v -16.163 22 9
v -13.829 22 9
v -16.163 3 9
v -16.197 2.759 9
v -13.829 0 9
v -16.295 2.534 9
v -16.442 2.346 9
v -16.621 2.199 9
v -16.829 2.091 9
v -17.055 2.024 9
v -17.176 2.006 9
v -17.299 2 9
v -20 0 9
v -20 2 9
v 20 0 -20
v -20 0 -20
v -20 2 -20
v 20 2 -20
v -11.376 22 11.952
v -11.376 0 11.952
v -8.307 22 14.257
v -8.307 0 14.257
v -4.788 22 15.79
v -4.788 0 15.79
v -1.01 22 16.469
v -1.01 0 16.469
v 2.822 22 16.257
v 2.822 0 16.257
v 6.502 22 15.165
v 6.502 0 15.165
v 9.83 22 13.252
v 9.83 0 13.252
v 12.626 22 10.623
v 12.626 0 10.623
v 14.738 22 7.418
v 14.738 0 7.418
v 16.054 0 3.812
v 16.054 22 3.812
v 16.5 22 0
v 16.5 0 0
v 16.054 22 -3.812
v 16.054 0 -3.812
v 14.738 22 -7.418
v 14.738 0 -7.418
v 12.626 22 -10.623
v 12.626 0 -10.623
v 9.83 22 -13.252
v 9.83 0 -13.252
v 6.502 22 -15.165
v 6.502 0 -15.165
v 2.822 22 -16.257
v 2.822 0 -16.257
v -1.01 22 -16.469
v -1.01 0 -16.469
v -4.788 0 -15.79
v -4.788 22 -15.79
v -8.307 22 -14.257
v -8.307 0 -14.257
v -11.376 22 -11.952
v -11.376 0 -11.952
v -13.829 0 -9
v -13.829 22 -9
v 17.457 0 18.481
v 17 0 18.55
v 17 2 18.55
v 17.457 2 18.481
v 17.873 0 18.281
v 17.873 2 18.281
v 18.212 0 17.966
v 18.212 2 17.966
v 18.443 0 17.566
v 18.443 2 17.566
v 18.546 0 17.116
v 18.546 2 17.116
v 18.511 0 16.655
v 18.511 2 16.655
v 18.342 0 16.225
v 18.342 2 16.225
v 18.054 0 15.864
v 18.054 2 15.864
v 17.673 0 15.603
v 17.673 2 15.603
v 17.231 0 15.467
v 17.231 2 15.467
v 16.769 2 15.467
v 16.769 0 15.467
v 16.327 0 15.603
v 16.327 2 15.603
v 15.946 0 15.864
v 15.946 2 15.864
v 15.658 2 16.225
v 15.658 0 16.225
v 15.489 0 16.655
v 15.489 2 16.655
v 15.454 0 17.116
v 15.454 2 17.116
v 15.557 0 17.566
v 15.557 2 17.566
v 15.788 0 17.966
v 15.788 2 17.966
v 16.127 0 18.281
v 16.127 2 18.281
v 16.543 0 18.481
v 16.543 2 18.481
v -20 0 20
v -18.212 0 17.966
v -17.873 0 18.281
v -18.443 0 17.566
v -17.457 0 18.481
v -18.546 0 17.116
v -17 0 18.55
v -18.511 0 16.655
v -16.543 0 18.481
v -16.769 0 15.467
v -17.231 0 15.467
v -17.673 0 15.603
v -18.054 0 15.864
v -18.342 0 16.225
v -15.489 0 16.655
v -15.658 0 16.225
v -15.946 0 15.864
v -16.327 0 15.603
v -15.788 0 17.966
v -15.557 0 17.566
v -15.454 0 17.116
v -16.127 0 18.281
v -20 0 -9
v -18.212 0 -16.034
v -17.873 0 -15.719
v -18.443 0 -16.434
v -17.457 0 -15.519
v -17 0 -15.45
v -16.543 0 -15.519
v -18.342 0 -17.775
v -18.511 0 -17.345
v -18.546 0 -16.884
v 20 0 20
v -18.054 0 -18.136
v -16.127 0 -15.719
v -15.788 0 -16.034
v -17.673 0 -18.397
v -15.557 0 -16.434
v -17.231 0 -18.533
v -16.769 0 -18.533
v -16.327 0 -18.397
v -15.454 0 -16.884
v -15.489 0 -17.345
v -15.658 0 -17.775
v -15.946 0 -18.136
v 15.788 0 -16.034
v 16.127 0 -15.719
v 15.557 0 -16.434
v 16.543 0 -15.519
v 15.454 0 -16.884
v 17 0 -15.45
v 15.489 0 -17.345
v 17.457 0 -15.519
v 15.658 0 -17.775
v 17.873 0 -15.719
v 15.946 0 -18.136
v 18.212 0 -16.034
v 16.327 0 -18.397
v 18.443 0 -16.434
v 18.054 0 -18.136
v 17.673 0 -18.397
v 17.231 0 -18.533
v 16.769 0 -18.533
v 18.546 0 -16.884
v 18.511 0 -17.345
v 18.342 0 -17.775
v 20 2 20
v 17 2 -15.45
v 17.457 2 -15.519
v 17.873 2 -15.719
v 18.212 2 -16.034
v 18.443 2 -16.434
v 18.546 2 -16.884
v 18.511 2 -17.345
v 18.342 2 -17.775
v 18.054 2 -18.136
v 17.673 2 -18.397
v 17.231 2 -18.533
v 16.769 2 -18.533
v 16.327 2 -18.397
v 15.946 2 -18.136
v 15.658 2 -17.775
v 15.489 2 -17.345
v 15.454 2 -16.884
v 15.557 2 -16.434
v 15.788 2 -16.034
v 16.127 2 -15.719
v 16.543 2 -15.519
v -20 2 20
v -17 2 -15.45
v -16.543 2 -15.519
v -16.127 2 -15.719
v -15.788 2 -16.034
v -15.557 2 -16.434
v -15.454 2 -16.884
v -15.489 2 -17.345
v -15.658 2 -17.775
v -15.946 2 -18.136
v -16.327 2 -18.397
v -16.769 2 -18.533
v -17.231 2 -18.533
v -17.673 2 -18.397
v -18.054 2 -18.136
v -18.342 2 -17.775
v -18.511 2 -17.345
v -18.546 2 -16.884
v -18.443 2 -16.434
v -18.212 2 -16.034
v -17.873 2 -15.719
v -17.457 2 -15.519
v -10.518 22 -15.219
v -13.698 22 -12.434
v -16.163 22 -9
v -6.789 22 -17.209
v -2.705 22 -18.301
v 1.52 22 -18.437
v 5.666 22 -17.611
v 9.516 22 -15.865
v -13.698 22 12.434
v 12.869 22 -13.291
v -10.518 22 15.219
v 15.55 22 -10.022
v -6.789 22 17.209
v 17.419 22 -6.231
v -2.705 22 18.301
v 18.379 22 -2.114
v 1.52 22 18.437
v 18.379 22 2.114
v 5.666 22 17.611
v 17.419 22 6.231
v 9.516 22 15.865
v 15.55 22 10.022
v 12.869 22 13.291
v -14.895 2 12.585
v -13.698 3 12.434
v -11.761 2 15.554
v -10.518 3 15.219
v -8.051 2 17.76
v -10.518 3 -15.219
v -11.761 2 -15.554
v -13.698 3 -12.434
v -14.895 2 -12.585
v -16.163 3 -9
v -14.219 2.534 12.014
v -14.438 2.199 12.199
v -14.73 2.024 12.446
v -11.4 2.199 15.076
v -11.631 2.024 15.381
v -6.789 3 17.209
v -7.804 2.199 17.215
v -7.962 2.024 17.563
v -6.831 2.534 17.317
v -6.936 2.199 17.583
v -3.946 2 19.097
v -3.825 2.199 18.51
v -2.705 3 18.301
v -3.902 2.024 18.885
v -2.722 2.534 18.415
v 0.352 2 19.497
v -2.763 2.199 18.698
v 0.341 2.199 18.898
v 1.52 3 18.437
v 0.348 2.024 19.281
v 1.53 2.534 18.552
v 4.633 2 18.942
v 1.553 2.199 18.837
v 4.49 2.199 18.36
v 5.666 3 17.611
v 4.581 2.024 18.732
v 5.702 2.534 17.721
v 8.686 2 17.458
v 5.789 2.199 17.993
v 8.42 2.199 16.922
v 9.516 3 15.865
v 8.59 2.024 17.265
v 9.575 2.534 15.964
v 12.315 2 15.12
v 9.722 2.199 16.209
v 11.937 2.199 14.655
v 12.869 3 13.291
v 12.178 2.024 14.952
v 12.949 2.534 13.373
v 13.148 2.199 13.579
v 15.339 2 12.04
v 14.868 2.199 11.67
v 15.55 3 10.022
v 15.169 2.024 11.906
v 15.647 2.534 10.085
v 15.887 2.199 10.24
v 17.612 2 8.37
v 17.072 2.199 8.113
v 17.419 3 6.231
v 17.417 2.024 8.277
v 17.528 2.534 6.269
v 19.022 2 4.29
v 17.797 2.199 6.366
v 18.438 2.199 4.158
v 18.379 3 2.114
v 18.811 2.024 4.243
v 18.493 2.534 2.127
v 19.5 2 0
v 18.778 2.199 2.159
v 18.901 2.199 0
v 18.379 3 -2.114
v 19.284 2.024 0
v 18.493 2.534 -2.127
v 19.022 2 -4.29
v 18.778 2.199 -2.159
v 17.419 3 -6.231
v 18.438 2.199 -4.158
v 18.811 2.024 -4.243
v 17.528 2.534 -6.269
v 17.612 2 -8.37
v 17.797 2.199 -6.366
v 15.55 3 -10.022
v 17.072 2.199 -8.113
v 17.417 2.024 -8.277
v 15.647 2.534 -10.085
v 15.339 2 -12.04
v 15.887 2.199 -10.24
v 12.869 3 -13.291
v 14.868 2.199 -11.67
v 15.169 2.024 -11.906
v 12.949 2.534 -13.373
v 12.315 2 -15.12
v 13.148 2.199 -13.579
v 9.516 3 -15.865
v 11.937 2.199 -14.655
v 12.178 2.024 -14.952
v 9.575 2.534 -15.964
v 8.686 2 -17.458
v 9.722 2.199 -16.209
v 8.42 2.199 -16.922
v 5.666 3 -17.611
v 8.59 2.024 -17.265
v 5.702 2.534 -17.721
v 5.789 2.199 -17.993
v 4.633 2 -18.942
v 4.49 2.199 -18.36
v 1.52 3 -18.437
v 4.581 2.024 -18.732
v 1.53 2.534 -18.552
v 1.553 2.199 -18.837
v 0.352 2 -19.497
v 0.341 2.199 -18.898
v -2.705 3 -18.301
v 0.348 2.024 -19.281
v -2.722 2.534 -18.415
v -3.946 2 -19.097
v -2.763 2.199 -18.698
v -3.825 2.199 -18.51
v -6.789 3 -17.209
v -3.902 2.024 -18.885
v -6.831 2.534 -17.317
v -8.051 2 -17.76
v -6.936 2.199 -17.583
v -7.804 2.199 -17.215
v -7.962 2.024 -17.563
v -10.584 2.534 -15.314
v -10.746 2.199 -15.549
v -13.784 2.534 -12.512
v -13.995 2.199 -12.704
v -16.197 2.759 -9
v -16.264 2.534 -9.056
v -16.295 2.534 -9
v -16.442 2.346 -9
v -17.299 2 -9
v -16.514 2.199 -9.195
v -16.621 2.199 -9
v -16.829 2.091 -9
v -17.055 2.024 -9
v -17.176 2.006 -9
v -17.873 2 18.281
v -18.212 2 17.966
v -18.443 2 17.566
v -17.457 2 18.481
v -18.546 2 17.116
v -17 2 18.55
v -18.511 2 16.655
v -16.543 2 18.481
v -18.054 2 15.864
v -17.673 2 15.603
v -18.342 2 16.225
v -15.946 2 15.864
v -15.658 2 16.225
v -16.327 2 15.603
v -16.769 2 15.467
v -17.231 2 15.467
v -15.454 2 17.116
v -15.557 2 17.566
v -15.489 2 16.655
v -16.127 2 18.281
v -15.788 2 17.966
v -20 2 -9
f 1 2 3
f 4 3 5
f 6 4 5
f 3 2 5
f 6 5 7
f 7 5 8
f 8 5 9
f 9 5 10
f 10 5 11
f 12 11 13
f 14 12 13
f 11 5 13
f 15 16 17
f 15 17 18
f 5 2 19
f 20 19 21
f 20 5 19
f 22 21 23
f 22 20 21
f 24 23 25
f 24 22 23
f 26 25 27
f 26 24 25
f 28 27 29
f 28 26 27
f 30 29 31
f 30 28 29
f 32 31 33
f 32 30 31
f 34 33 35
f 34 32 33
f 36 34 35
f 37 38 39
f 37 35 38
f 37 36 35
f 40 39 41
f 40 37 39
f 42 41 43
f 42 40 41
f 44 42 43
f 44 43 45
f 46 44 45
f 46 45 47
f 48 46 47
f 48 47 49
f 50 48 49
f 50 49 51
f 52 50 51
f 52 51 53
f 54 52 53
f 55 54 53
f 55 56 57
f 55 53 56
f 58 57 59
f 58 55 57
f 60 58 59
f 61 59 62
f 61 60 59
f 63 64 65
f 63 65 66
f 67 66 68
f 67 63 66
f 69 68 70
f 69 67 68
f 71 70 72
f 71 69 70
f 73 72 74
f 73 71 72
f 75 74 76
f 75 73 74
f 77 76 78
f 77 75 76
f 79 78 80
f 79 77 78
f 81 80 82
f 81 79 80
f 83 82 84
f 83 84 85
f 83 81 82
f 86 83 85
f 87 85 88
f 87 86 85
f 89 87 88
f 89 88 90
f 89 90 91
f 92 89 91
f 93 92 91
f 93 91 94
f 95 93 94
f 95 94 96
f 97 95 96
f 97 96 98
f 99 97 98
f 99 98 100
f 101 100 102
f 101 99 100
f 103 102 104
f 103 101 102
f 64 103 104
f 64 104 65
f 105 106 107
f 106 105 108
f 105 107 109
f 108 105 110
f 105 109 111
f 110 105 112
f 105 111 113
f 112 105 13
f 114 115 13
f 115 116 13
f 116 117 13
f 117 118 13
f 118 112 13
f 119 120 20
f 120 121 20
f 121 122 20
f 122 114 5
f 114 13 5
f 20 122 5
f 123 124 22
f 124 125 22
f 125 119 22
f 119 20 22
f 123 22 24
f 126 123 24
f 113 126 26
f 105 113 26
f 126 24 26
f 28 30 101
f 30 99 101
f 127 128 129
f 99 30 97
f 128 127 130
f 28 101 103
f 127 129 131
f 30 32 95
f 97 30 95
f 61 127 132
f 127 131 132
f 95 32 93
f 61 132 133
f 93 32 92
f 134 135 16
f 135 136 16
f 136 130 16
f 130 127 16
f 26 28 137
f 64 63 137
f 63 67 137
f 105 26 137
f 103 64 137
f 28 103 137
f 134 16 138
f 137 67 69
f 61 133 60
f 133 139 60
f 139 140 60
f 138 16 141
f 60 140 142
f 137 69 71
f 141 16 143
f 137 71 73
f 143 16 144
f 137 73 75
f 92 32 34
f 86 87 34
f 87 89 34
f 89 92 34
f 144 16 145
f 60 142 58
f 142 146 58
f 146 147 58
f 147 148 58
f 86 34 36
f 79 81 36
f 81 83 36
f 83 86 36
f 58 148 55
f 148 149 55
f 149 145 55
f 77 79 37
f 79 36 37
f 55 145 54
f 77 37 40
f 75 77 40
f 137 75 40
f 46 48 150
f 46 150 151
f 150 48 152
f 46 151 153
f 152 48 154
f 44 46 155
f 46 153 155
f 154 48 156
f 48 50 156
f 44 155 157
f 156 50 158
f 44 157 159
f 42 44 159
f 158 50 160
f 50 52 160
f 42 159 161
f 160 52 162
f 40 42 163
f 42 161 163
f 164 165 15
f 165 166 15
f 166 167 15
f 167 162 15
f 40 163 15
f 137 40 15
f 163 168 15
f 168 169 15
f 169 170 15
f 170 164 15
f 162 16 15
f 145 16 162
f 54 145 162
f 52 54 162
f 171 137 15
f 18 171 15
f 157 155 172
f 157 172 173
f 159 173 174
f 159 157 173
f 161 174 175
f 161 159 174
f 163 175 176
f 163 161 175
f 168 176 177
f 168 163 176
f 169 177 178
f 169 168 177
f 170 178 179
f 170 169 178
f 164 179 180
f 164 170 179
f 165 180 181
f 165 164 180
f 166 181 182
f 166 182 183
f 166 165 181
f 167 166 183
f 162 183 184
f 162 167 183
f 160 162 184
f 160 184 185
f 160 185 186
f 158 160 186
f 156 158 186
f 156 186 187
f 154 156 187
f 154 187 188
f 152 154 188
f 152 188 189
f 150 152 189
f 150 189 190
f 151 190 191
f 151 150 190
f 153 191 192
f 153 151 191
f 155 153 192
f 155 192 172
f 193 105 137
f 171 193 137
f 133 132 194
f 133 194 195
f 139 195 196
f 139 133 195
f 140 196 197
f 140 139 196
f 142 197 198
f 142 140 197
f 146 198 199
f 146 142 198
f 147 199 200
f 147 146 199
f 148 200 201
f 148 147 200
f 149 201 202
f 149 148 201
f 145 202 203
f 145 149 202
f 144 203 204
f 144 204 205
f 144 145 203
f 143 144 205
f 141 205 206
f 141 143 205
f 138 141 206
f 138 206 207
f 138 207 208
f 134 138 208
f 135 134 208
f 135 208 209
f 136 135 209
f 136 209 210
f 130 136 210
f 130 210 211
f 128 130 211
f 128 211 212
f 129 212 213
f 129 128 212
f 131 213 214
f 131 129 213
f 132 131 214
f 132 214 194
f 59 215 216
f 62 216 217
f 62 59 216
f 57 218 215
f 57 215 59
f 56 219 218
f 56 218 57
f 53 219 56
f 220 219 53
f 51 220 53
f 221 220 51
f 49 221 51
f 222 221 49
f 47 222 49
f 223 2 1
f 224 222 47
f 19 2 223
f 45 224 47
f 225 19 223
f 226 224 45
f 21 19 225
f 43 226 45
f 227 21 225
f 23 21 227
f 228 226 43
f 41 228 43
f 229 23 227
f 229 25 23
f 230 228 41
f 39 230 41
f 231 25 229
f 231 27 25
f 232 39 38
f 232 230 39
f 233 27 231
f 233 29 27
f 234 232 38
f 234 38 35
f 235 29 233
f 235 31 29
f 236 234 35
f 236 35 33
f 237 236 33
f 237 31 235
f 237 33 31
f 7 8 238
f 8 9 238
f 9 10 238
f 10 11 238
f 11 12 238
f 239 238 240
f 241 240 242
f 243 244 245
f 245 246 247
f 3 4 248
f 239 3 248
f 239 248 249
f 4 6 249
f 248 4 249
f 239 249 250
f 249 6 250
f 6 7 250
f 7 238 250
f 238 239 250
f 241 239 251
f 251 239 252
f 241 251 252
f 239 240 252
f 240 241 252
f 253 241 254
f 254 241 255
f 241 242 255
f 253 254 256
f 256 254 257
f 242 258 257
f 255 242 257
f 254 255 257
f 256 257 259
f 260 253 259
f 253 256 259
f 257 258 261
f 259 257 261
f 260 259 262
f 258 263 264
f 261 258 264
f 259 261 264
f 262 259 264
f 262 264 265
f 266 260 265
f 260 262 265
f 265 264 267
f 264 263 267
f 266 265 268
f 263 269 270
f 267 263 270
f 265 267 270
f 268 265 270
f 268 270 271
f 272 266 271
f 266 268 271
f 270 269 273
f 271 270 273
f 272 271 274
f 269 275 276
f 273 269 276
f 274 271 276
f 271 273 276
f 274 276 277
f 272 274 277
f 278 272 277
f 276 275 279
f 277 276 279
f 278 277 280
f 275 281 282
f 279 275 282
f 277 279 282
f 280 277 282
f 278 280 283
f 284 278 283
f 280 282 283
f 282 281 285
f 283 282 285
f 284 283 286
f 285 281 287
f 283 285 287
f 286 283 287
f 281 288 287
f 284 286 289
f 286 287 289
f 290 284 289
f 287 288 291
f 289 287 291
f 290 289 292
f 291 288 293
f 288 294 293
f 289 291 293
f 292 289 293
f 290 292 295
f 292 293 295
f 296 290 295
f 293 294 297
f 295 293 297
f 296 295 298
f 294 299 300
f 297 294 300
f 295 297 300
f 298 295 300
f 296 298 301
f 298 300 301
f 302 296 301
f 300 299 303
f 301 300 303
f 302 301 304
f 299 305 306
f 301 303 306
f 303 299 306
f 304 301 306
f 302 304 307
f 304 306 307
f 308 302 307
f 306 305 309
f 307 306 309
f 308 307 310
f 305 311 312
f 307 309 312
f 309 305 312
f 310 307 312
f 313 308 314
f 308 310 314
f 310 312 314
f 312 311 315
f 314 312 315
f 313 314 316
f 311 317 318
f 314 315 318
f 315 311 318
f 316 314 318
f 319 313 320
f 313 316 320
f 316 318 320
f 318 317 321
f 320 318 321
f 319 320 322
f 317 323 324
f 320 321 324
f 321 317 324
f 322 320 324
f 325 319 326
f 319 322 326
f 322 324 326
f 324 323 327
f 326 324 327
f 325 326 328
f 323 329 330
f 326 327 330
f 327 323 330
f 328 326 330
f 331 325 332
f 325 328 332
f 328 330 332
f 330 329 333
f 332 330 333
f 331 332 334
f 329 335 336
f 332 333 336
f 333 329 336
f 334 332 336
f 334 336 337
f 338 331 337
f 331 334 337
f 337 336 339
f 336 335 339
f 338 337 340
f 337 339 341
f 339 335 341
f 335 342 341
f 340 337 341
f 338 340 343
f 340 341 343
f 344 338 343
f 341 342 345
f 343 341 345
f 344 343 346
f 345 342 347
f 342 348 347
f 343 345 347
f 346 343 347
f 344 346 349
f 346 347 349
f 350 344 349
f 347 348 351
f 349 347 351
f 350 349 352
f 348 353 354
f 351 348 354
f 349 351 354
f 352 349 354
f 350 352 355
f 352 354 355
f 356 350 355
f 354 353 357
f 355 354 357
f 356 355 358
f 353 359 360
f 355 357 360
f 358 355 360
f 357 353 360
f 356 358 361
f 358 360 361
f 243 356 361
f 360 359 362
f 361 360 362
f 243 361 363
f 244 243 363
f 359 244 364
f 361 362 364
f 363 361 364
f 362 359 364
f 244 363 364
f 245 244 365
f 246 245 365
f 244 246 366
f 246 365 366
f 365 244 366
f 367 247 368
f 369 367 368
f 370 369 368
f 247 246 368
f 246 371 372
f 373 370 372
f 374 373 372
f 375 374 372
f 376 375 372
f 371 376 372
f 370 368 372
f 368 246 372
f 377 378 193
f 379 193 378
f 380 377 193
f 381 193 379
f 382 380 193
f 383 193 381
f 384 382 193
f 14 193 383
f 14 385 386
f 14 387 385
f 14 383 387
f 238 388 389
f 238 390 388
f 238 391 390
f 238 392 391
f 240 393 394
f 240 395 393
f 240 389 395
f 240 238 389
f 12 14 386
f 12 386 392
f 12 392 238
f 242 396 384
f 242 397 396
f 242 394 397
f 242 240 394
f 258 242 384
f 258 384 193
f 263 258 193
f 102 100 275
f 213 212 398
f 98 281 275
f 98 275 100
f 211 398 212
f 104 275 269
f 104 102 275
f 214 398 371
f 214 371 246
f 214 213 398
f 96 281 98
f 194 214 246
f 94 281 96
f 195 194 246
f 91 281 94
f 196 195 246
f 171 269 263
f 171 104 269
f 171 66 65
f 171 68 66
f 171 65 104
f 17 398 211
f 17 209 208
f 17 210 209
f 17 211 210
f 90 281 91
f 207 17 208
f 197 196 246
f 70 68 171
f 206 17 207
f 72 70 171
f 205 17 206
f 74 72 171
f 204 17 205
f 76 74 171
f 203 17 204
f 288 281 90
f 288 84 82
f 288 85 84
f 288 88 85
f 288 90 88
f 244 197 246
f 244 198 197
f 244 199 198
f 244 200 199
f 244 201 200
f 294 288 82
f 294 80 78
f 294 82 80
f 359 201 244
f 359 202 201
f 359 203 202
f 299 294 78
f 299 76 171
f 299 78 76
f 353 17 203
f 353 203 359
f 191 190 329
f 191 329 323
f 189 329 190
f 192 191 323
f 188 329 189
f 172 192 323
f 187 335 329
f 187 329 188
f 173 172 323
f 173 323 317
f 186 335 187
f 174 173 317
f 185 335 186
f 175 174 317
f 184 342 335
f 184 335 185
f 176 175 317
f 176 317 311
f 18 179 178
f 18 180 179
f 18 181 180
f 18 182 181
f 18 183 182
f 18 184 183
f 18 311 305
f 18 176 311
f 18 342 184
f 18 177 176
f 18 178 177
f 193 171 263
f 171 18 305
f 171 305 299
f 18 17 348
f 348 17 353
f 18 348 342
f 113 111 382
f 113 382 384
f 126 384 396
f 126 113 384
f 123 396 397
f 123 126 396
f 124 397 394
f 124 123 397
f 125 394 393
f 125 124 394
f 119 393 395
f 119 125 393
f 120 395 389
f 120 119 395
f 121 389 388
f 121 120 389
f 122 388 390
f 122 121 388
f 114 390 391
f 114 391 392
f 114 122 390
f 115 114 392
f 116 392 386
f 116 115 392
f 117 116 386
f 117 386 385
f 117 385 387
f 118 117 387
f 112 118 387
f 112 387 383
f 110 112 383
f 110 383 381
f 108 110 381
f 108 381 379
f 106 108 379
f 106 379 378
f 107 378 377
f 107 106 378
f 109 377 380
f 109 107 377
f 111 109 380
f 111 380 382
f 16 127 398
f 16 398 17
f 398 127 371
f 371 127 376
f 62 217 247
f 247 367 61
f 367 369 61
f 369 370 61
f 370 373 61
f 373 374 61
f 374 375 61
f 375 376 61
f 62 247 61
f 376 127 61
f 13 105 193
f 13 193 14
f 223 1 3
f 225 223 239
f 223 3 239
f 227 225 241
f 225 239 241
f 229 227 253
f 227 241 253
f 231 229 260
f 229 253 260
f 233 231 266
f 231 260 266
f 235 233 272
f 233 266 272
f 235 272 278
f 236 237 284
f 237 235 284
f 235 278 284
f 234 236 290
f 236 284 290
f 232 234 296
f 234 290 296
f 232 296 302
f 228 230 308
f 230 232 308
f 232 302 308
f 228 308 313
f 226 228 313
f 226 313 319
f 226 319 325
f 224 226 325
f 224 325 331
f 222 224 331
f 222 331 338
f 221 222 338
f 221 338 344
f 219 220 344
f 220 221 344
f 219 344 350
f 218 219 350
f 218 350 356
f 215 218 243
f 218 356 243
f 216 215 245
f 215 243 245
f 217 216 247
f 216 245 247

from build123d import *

# Parameters (mm, degrees)
SKETCH_1_W          = 40
SKETCH_1_H          = 40
SKETCH_1_R          = 1.55
SKETCH_1_R_2        = 16.5
EXTRUDE_1_DEPTH     = 2
SKETCH_2_R          = 18.5
SKETCH_2_R_2        = 16.5
EXTRUDE_2_DEPTH     = 20
FILLET_1_R          = 1
CUT_EXTRUDE_1_DEPTH = 36.832945734


with BuildPart() as part:
    # 草图1 → 凸台-拉伸1 (new body)
    with BuildSketch(Plane(origin=(0, 0, 0), x_dir=(1, 0, 0), z_dir=(0, 1, 0))):
        Rectangle(SKETCH_1_W, SKETCH_1_H)
        with Locations(Location((-17, 17, 0), (0, 0, 270))):
            Circle(SKETCH_1_R, mode=Mode.SUBTRACT)
        with Locations(Location((17, 17, 0), (0, 0, 270))):
            Circle(SKETCH_1_R, mode=Mode.SUBTRACT)
        with Locations(Location((17, -17, 0), (0, 0, 270))):
            Circle(SKETCH_1_R, mode=Mode.SUBTRACT)
        with Locations(Location((-17, -17, 0), (0, 0, 270))):
            Circle(SKETCH_1_R, mode=Mode.SUBTRACT)
        with Locations(Location((0, 0, 0), (0, 0, 270))):
            Circle(SKETCH_1_R_2, mode=Mode.SUBTRACT)
    extrude(amount=EXTRUDE_1_DEPTH)

    # 草图2 → 凸台-拉伸2 (add)
    with BuildSketch(Plane(origin=(0, 2, 0), x_dir=(1, 0, 0), z_dir=(0, 1, 0))):
        with Locations(Location((0, 0, 0), (0, 0, 270))):
            Circle(SKETCH_2_R)
        with Locations(Location((0, 0, 0), (0, 0, 270))):
            Circle(SKETCH_2_R_2, mode=Mode.SUBTRACT)
    extrude(amount=EXTRUDE_2_DEPTH)

    # 圆角1
    fillet_1_edges = [part.edges().sort_by_distance(p)[0] for p in [
        (0, 2, -18.5),
    ]]
    fillet(fillet_1_edges, radius=FILLET_1_R)

    # 草图3 → 切除-拉伸1 (cut, through all)
    with BuildSketch(Plane.XZ):
        with BuildLine():
            ThreePointArc((-13.829316686, -9), (-15.818244614, -4.693946883), (-16.5, 0))
            ThreePointArc((-16.5, 0), (-15.818244614, 4.693946883), (-13.829316686, 9))
            Line((-13.829316686, 9), (-20, 9))
            Line((-20, 9), (-20, -9))
            Line((-20, -9), (-13.829316686, -9))
        make_face()
    extrude(amount=-CUT_EXTRUDE_1_DEPTH, mode=Mode.SUBTRACT)


solid = part.part
